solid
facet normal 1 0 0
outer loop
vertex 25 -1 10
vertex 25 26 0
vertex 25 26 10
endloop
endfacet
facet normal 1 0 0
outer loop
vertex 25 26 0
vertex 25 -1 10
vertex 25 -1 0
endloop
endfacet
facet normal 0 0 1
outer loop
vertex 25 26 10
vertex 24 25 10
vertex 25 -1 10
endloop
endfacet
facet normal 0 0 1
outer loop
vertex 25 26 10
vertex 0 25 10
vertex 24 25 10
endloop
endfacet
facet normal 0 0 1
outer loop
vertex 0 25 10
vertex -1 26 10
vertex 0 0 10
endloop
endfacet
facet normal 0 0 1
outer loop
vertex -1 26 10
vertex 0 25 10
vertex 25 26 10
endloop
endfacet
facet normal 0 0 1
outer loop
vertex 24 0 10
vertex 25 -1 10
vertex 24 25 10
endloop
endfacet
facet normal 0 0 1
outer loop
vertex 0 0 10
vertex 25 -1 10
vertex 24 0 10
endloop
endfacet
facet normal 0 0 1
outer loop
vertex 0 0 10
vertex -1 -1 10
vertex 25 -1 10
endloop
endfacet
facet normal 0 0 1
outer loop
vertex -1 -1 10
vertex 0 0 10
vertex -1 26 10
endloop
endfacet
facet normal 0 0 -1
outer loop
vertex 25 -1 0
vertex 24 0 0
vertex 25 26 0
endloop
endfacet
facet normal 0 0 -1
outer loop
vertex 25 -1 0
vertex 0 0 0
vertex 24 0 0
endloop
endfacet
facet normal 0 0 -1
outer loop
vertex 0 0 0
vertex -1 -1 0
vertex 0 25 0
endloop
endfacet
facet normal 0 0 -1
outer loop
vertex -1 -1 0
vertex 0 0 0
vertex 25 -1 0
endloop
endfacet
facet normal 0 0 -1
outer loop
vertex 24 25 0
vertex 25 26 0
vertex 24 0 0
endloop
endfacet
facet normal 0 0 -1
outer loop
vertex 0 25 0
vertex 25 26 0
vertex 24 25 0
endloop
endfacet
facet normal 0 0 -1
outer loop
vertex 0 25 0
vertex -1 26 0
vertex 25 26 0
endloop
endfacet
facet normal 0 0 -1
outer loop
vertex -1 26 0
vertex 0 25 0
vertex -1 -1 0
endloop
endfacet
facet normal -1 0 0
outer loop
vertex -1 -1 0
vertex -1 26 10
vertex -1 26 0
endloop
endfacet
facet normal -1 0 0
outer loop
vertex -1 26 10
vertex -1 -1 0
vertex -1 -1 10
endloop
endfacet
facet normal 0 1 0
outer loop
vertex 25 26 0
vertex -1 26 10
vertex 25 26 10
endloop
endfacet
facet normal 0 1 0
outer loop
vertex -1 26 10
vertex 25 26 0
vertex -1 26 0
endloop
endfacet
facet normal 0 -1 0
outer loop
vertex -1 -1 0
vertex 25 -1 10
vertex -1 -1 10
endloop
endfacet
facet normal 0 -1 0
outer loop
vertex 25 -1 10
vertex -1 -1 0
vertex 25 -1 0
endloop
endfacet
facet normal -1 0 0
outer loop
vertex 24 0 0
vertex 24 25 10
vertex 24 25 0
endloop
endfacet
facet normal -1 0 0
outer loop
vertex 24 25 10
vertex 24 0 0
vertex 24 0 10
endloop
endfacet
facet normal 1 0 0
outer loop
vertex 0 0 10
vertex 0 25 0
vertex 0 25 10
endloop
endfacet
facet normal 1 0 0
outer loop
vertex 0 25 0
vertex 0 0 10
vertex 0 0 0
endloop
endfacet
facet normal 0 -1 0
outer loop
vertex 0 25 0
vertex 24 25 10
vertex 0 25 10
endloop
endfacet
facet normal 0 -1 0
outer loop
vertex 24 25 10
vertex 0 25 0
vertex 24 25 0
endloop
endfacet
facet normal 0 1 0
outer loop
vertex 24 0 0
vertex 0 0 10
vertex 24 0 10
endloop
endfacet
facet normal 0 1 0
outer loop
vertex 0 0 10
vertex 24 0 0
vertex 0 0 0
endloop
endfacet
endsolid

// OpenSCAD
module battery_sling(dimensions, wall = 1) {
    difference() {
        translate([-wall, -wall, 0]) cube([dimensions.x + 2 * wall, dimensions.y + 2 * wall, dimensions.z]);
        cube([dimensions.x, dimensions.y, dimensions.z]);
    }
}

battery_sling([24, 25, 10]);
